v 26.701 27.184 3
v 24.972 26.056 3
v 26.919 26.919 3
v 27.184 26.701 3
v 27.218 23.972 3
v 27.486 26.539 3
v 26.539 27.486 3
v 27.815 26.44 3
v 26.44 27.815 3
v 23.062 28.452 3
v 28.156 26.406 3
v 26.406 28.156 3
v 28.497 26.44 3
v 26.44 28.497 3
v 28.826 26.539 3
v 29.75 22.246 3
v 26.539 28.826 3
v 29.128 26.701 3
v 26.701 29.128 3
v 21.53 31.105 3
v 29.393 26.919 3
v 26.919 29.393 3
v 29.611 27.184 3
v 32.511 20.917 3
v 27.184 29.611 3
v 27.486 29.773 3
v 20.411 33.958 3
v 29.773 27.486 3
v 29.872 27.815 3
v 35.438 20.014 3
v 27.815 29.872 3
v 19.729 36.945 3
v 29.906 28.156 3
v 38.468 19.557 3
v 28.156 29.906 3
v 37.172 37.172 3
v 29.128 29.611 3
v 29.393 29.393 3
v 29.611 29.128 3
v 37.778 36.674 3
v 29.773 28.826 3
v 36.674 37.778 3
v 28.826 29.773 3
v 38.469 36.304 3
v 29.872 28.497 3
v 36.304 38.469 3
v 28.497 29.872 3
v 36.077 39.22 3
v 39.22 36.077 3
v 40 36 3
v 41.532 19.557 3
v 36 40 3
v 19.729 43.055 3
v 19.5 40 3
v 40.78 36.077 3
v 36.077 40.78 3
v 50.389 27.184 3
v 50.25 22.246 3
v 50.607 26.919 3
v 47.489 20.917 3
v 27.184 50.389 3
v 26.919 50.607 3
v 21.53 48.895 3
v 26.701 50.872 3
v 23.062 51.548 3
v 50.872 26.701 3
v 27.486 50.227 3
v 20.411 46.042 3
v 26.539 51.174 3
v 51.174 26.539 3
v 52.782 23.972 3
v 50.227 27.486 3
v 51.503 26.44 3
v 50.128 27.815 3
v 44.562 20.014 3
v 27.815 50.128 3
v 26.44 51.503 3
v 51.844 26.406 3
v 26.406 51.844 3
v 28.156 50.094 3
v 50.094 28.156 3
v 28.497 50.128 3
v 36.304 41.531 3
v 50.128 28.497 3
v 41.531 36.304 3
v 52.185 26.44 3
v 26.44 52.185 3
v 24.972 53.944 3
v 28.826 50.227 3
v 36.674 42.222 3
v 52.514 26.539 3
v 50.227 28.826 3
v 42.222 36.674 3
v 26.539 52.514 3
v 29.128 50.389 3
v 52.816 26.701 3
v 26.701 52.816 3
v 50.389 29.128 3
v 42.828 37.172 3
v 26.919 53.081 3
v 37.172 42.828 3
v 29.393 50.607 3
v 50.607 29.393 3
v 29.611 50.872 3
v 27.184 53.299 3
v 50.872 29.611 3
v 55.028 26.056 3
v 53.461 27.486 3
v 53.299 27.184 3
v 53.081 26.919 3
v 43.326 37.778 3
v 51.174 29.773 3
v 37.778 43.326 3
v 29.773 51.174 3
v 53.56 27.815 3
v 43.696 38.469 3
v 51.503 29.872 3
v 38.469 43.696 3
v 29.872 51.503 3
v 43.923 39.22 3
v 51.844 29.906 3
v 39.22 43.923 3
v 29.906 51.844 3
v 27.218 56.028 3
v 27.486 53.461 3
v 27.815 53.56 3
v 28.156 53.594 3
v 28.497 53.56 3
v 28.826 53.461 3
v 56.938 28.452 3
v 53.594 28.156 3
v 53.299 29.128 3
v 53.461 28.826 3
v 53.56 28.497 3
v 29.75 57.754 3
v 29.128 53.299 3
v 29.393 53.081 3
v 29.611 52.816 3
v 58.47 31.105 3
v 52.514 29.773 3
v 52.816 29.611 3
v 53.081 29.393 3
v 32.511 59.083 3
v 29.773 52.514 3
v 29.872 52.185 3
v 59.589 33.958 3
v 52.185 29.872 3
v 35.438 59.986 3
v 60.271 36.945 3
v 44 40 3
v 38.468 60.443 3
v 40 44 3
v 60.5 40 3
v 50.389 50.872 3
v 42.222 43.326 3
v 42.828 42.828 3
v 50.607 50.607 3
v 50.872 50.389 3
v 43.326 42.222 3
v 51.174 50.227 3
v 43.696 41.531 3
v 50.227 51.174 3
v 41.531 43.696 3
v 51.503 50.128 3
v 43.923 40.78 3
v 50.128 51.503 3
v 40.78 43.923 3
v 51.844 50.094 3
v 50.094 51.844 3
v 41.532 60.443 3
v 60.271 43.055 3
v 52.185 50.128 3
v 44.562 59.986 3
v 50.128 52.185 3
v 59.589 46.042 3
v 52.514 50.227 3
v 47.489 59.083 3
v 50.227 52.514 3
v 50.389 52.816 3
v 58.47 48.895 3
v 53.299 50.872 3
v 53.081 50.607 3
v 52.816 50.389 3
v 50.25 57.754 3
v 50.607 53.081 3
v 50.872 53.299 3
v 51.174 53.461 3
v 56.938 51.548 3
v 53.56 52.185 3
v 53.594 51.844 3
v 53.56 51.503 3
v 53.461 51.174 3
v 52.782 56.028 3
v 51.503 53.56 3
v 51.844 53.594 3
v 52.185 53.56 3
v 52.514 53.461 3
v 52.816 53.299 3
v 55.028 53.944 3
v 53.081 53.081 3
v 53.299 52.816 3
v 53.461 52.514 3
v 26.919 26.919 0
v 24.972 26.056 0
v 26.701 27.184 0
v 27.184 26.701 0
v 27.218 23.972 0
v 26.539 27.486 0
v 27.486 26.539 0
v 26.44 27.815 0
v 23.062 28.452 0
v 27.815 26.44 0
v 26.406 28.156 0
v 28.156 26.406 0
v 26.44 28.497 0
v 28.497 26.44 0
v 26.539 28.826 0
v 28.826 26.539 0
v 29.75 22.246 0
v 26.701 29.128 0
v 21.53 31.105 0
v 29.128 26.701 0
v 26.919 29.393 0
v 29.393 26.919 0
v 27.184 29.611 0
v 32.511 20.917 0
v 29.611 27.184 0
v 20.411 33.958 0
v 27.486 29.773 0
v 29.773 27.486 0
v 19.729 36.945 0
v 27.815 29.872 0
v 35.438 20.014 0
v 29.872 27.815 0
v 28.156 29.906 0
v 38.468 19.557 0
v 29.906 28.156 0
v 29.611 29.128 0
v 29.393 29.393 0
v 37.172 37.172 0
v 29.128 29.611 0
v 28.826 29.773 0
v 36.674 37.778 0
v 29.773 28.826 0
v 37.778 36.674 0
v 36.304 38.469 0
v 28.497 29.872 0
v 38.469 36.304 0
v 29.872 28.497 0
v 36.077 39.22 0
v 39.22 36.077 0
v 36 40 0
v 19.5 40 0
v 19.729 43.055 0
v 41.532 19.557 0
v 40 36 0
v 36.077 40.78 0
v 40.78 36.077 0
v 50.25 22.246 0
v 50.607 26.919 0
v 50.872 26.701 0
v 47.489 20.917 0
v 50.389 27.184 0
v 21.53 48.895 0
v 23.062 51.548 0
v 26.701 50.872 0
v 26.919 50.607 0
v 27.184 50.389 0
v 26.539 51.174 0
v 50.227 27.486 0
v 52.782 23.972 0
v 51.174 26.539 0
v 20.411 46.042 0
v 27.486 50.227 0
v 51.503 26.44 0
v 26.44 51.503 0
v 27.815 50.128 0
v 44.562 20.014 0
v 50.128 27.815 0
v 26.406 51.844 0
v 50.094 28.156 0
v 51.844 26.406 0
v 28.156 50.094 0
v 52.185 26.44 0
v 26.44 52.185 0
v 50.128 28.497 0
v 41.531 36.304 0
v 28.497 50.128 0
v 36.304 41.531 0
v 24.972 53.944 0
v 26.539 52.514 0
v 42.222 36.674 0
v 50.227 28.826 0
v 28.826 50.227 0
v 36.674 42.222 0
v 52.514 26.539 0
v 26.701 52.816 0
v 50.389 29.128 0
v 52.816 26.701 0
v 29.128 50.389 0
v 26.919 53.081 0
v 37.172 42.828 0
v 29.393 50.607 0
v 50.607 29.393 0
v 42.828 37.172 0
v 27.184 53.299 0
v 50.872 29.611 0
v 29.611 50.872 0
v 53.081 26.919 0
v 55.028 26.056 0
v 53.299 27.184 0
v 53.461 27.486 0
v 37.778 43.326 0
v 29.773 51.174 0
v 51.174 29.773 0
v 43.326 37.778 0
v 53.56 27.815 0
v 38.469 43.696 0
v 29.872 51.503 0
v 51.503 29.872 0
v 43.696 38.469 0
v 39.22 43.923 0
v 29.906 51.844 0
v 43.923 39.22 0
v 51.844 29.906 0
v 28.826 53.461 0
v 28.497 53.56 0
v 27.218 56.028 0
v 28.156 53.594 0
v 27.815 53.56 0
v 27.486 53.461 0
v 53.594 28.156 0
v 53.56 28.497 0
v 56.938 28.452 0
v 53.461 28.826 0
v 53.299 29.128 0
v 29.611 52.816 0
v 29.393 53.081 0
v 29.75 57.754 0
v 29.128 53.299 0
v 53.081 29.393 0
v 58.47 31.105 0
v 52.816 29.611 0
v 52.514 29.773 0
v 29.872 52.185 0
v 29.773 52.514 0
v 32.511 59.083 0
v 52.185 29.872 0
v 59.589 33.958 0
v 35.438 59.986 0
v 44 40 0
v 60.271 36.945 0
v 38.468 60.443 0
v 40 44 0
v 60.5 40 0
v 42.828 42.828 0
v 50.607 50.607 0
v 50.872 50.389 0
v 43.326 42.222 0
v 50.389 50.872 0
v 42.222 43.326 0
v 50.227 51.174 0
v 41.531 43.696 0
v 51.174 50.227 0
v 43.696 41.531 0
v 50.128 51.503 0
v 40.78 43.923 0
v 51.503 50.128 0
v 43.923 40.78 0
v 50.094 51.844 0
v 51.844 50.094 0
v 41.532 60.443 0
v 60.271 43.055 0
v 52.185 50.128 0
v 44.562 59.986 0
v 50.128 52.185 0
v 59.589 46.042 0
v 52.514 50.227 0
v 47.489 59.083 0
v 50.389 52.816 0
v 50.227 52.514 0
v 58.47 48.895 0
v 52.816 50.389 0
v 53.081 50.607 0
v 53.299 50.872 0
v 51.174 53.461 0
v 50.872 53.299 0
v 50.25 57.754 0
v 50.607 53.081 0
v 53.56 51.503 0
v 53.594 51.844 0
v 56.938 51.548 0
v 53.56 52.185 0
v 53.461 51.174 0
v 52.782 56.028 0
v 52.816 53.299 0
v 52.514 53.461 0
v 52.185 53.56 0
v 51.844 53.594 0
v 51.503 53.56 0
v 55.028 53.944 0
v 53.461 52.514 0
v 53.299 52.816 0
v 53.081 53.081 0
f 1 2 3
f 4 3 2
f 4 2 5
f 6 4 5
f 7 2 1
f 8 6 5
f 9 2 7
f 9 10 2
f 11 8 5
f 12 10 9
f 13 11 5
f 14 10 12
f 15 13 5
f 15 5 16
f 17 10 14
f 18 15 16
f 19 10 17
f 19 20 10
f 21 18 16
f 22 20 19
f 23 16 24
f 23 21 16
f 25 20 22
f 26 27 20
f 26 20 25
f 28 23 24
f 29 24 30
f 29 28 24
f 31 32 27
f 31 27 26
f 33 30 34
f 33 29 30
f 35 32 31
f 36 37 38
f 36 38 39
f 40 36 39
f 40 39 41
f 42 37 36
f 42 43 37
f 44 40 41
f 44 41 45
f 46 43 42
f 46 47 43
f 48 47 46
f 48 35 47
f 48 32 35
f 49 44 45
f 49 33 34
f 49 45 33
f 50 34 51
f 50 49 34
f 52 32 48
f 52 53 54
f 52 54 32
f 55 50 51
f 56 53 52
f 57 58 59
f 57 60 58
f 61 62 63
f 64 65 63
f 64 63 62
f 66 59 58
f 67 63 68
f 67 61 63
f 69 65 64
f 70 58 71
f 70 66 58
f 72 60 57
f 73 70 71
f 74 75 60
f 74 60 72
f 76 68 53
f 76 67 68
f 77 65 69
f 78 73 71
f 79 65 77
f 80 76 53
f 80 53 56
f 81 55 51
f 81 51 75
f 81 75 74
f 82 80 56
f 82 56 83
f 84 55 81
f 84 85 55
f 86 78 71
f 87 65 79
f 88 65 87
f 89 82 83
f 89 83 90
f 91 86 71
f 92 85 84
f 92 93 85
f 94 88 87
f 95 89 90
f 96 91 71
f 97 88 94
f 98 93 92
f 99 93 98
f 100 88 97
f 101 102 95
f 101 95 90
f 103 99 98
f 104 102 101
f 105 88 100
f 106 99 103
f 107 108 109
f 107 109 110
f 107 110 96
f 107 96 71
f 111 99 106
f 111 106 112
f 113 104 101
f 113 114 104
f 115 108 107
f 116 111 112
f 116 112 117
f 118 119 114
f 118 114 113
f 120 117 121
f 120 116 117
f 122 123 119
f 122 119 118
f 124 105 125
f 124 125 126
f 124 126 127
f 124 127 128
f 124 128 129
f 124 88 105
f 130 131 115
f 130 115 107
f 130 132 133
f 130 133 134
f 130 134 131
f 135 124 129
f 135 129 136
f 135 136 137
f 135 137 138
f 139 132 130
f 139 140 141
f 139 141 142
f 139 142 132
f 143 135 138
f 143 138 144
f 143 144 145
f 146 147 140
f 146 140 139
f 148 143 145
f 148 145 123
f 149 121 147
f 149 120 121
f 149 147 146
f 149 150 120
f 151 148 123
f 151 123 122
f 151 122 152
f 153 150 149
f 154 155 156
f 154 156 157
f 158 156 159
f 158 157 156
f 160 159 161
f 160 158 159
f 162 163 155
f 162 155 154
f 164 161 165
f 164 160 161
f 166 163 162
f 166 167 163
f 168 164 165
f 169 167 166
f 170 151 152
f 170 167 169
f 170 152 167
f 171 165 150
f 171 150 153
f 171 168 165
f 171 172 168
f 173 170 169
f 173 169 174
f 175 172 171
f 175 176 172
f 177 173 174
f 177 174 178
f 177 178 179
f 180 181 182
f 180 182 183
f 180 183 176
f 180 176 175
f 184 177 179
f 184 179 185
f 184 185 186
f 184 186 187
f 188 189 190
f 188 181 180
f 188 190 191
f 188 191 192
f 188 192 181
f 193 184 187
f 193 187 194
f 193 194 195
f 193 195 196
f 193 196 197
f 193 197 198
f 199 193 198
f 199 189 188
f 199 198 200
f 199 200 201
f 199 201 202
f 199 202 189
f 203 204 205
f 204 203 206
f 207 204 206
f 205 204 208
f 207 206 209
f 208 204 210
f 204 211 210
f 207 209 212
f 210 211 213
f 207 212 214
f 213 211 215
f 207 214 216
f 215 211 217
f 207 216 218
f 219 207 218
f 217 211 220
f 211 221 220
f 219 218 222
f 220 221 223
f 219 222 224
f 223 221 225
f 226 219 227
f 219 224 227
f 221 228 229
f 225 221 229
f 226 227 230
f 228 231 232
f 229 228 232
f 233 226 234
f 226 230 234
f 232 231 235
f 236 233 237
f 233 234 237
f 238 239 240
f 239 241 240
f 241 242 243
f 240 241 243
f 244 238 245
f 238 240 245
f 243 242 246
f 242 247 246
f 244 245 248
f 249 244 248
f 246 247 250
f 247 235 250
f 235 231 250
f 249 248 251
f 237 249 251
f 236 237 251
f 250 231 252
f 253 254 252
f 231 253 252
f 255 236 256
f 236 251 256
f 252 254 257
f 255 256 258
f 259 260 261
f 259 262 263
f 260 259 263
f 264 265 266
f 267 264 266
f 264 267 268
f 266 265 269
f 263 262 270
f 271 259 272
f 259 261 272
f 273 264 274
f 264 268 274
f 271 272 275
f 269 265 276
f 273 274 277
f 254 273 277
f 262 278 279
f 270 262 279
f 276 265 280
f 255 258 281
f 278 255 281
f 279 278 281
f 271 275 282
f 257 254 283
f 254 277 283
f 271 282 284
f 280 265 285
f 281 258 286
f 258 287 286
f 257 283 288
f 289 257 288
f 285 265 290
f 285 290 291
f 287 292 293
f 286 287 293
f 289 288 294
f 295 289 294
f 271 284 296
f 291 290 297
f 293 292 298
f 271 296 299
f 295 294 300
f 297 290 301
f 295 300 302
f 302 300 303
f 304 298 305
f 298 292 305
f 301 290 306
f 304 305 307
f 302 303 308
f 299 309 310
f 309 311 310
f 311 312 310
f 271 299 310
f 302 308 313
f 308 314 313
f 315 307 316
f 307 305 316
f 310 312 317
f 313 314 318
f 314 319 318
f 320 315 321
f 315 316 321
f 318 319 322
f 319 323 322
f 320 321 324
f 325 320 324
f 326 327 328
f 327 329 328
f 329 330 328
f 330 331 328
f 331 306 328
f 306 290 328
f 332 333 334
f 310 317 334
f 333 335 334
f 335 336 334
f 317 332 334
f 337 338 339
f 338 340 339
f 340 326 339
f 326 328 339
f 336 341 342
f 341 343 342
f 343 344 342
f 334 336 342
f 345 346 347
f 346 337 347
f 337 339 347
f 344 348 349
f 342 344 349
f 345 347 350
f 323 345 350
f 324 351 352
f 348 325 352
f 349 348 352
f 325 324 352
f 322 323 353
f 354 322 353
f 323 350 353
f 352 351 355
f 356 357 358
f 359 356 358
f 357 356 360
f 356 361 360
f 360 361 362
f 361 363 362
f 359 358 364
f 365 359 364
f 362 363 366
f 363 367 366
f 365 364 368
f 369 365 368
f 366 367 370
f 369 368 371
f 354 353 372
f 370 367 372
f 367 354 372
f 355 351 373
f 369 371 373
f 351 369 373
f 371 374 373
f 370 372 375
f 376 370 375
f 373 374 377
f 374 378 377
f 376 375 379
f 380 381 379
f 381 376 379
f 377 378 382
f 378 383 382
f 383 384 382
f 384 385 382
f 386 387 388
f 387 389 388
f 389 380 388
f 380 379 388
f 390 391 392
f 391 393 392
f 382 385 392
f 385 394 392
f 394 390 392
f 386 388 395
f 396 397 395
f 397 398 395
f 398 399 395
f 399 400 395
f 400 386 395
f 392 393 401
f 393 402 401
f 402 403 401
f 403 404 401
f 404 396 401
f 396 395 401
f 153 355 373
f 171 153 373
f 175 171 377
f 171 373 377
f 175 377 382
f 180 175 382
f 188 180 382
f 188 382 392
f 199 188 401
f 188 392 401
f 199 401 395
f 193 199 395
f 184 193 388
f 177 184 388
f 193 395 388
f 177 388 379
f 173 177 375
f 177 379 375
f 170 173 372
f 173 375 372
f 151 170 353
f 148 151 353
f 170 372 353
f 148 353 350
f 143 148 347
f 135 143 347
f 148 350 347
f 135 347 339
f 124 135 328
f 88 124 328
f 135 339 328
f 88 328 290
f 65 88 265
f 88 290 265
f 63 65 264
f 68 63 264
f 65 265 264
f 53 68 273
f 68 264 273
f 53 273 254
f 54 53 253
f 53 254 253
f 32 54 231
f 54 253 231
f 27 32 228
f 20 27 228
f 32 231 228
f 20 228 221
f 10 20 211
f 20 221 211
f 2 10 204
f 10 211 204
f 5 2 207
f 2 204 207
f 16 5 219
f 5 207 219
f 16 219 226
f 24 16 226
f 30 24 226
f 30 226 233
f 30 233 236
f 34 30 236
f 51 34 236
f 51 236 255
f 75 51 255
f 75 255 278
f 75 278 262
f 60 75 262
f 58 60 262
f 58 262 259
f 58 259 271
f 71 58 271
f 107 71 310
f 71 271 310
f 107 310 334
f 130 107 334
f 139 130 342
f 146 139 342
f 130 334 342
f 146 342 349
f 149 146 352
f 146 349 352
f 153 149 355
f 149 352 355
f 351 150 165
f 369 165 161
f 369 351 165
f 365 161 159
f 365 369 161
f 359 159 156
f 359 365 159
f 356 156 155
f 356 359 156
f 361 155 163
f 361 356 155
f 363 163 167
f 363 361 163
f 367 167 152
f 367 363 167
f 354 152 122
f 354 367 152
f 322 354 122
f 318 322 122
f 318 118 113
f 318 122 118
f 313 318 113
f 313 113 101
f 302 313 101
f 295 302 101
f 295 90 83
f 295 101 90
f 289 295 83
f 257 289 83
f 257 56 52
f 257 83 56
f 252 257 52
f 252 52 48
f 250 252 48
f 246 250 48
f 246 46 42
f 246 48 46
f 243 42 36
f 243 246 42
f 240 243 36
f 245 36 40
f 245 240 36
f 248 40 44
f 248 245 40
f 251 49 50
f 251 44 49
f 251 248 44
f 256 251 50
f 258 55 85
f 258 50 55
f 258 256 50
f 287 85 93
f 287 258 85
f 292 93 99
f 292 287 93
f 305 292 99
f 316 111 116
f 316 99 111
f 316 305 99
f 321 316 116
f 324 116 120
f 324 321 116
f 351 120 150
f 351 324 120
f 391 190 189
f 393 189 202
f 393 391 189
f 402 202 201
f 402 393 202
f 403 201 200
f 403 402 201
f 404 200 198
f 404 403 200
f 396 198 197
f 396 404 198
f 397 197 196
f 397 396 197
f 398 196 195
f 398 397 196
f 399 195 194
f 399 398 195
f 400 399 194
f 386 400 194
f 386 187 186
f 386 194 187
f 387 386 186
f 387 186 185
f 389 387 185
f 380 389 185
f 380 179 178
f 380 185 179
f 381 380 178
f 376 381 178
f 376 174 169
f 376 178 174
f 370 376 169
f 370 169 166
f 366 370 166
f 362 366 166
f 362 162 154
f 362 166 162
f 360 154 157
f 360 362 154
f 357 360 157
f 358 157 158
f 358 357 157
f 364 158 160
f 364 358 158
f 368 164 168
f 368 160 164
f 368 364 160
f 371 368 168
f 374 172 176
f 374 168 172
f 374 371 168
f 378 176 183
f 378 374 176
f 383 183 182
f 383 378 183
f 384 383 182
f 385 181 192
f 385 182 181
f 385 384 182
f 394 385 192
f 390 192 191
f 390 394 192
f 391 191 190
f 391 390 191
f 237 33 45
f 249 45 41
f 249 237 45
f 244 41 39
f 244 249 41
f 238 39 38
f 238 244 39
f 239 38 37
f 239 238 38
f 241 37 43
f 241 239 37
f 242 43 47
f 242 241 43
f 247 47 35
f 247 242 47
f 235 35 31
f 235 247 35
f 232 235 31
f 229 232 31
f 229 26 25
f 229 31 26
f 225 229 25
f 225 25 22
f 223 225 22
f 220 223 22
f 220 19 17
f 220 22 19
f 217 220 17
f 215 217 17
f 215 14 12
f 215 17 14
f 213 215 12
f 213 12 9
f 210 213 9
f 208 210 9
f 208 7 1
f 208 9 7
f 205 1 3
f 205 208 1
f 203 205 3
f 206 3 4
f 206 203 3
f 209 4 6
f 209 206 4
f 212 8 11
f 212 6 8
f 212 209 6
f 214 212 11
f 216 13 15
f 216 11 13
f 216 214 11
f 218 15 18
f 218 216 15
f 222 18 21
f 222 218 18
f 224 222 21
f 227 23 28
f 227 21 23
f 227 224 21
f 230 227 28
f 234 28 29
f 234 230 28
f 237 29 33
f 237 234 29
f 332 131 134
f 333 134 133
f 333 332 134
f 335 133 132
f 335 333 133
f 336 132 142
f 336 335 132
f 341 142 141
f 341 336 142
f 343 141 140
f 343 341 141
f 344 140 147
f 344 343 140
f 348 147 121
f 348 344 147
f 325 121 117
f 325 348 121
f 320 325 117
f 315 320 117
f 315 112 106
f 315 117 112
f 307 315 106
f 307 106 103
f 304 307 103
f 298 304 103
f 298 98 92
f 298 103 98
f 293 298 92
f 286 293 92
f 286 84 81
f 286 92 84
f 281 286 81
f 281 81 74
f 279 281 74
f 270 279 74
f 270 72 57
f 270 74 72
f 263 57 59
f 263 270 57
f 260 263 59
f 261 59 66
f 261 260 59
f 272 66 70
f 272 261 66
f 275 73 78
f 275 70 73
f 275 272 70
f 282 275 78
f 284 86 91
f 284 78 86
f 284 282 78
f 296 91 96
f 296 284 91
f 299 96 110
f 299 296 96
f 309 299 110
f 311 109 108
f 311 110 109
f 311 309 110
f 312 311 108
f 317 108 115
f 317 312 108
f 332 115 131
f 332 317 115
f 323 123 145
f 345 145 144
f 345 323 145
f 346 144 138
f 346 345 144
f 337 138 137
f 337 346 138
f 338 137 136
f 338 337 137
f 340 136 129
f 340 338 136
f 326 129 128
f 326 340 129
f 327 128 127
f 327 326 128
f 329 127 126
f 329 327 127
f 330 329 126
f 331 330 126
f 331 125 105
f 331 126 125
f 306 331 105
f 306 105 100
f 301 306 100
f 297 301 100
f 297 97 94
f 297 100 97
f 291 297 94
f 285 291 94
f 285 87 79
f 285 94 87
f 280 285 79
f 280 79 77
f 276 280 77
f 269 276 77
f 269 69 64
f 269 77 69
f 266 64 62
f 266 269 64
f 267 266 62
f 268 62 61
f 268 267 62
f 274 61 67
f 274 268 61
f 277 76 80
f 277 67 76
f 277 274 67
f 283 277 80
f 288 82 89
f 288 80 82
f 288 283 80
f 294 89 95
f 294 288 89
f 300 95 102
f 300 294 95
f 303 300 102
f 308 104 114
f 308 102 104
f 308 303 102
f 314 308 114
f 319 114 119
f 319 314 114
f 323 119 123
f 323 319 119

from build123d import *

# Parameters (mm, degrees)
SKETCH_R      = 20.5
PAD_DEPTH     = 3
SKETCH001_R   = 4
SKETCH001_R_2 = 1.75
POCKET_DEPTH  = 3.001


with BuildPart() as part:
    # Sketch → Pad (new body)
    with BuildSketch(Plane.XY):
        with Locations((40, 40)):
            Circle(SKETCH_R)
    extrude(amount=PAD_DEPTH)

    # Sketch001 → Pocket (cut, through all)
    with BuildSketch(Plane.XY):
        with Locations((40, 40)):
            Circle(SKETCH001_R)
        with Locations((28.155961, 28.155961)):
            Circle(SKETCH001_R_2)
        with Locations((51.844039, 28.155961)):
            Circle(SKETCH001_R_2)
        with Locations((51.844039, 51.844039)):
            Circle(SKETCH001_R_2)
        with Locations((28.155961, 51.844039)):
            Circle(SKETCH001_R_2)
    extrude(amount=POCKET_DEPTH, mode=Mode.SUBTRACT)


solid = part.part
